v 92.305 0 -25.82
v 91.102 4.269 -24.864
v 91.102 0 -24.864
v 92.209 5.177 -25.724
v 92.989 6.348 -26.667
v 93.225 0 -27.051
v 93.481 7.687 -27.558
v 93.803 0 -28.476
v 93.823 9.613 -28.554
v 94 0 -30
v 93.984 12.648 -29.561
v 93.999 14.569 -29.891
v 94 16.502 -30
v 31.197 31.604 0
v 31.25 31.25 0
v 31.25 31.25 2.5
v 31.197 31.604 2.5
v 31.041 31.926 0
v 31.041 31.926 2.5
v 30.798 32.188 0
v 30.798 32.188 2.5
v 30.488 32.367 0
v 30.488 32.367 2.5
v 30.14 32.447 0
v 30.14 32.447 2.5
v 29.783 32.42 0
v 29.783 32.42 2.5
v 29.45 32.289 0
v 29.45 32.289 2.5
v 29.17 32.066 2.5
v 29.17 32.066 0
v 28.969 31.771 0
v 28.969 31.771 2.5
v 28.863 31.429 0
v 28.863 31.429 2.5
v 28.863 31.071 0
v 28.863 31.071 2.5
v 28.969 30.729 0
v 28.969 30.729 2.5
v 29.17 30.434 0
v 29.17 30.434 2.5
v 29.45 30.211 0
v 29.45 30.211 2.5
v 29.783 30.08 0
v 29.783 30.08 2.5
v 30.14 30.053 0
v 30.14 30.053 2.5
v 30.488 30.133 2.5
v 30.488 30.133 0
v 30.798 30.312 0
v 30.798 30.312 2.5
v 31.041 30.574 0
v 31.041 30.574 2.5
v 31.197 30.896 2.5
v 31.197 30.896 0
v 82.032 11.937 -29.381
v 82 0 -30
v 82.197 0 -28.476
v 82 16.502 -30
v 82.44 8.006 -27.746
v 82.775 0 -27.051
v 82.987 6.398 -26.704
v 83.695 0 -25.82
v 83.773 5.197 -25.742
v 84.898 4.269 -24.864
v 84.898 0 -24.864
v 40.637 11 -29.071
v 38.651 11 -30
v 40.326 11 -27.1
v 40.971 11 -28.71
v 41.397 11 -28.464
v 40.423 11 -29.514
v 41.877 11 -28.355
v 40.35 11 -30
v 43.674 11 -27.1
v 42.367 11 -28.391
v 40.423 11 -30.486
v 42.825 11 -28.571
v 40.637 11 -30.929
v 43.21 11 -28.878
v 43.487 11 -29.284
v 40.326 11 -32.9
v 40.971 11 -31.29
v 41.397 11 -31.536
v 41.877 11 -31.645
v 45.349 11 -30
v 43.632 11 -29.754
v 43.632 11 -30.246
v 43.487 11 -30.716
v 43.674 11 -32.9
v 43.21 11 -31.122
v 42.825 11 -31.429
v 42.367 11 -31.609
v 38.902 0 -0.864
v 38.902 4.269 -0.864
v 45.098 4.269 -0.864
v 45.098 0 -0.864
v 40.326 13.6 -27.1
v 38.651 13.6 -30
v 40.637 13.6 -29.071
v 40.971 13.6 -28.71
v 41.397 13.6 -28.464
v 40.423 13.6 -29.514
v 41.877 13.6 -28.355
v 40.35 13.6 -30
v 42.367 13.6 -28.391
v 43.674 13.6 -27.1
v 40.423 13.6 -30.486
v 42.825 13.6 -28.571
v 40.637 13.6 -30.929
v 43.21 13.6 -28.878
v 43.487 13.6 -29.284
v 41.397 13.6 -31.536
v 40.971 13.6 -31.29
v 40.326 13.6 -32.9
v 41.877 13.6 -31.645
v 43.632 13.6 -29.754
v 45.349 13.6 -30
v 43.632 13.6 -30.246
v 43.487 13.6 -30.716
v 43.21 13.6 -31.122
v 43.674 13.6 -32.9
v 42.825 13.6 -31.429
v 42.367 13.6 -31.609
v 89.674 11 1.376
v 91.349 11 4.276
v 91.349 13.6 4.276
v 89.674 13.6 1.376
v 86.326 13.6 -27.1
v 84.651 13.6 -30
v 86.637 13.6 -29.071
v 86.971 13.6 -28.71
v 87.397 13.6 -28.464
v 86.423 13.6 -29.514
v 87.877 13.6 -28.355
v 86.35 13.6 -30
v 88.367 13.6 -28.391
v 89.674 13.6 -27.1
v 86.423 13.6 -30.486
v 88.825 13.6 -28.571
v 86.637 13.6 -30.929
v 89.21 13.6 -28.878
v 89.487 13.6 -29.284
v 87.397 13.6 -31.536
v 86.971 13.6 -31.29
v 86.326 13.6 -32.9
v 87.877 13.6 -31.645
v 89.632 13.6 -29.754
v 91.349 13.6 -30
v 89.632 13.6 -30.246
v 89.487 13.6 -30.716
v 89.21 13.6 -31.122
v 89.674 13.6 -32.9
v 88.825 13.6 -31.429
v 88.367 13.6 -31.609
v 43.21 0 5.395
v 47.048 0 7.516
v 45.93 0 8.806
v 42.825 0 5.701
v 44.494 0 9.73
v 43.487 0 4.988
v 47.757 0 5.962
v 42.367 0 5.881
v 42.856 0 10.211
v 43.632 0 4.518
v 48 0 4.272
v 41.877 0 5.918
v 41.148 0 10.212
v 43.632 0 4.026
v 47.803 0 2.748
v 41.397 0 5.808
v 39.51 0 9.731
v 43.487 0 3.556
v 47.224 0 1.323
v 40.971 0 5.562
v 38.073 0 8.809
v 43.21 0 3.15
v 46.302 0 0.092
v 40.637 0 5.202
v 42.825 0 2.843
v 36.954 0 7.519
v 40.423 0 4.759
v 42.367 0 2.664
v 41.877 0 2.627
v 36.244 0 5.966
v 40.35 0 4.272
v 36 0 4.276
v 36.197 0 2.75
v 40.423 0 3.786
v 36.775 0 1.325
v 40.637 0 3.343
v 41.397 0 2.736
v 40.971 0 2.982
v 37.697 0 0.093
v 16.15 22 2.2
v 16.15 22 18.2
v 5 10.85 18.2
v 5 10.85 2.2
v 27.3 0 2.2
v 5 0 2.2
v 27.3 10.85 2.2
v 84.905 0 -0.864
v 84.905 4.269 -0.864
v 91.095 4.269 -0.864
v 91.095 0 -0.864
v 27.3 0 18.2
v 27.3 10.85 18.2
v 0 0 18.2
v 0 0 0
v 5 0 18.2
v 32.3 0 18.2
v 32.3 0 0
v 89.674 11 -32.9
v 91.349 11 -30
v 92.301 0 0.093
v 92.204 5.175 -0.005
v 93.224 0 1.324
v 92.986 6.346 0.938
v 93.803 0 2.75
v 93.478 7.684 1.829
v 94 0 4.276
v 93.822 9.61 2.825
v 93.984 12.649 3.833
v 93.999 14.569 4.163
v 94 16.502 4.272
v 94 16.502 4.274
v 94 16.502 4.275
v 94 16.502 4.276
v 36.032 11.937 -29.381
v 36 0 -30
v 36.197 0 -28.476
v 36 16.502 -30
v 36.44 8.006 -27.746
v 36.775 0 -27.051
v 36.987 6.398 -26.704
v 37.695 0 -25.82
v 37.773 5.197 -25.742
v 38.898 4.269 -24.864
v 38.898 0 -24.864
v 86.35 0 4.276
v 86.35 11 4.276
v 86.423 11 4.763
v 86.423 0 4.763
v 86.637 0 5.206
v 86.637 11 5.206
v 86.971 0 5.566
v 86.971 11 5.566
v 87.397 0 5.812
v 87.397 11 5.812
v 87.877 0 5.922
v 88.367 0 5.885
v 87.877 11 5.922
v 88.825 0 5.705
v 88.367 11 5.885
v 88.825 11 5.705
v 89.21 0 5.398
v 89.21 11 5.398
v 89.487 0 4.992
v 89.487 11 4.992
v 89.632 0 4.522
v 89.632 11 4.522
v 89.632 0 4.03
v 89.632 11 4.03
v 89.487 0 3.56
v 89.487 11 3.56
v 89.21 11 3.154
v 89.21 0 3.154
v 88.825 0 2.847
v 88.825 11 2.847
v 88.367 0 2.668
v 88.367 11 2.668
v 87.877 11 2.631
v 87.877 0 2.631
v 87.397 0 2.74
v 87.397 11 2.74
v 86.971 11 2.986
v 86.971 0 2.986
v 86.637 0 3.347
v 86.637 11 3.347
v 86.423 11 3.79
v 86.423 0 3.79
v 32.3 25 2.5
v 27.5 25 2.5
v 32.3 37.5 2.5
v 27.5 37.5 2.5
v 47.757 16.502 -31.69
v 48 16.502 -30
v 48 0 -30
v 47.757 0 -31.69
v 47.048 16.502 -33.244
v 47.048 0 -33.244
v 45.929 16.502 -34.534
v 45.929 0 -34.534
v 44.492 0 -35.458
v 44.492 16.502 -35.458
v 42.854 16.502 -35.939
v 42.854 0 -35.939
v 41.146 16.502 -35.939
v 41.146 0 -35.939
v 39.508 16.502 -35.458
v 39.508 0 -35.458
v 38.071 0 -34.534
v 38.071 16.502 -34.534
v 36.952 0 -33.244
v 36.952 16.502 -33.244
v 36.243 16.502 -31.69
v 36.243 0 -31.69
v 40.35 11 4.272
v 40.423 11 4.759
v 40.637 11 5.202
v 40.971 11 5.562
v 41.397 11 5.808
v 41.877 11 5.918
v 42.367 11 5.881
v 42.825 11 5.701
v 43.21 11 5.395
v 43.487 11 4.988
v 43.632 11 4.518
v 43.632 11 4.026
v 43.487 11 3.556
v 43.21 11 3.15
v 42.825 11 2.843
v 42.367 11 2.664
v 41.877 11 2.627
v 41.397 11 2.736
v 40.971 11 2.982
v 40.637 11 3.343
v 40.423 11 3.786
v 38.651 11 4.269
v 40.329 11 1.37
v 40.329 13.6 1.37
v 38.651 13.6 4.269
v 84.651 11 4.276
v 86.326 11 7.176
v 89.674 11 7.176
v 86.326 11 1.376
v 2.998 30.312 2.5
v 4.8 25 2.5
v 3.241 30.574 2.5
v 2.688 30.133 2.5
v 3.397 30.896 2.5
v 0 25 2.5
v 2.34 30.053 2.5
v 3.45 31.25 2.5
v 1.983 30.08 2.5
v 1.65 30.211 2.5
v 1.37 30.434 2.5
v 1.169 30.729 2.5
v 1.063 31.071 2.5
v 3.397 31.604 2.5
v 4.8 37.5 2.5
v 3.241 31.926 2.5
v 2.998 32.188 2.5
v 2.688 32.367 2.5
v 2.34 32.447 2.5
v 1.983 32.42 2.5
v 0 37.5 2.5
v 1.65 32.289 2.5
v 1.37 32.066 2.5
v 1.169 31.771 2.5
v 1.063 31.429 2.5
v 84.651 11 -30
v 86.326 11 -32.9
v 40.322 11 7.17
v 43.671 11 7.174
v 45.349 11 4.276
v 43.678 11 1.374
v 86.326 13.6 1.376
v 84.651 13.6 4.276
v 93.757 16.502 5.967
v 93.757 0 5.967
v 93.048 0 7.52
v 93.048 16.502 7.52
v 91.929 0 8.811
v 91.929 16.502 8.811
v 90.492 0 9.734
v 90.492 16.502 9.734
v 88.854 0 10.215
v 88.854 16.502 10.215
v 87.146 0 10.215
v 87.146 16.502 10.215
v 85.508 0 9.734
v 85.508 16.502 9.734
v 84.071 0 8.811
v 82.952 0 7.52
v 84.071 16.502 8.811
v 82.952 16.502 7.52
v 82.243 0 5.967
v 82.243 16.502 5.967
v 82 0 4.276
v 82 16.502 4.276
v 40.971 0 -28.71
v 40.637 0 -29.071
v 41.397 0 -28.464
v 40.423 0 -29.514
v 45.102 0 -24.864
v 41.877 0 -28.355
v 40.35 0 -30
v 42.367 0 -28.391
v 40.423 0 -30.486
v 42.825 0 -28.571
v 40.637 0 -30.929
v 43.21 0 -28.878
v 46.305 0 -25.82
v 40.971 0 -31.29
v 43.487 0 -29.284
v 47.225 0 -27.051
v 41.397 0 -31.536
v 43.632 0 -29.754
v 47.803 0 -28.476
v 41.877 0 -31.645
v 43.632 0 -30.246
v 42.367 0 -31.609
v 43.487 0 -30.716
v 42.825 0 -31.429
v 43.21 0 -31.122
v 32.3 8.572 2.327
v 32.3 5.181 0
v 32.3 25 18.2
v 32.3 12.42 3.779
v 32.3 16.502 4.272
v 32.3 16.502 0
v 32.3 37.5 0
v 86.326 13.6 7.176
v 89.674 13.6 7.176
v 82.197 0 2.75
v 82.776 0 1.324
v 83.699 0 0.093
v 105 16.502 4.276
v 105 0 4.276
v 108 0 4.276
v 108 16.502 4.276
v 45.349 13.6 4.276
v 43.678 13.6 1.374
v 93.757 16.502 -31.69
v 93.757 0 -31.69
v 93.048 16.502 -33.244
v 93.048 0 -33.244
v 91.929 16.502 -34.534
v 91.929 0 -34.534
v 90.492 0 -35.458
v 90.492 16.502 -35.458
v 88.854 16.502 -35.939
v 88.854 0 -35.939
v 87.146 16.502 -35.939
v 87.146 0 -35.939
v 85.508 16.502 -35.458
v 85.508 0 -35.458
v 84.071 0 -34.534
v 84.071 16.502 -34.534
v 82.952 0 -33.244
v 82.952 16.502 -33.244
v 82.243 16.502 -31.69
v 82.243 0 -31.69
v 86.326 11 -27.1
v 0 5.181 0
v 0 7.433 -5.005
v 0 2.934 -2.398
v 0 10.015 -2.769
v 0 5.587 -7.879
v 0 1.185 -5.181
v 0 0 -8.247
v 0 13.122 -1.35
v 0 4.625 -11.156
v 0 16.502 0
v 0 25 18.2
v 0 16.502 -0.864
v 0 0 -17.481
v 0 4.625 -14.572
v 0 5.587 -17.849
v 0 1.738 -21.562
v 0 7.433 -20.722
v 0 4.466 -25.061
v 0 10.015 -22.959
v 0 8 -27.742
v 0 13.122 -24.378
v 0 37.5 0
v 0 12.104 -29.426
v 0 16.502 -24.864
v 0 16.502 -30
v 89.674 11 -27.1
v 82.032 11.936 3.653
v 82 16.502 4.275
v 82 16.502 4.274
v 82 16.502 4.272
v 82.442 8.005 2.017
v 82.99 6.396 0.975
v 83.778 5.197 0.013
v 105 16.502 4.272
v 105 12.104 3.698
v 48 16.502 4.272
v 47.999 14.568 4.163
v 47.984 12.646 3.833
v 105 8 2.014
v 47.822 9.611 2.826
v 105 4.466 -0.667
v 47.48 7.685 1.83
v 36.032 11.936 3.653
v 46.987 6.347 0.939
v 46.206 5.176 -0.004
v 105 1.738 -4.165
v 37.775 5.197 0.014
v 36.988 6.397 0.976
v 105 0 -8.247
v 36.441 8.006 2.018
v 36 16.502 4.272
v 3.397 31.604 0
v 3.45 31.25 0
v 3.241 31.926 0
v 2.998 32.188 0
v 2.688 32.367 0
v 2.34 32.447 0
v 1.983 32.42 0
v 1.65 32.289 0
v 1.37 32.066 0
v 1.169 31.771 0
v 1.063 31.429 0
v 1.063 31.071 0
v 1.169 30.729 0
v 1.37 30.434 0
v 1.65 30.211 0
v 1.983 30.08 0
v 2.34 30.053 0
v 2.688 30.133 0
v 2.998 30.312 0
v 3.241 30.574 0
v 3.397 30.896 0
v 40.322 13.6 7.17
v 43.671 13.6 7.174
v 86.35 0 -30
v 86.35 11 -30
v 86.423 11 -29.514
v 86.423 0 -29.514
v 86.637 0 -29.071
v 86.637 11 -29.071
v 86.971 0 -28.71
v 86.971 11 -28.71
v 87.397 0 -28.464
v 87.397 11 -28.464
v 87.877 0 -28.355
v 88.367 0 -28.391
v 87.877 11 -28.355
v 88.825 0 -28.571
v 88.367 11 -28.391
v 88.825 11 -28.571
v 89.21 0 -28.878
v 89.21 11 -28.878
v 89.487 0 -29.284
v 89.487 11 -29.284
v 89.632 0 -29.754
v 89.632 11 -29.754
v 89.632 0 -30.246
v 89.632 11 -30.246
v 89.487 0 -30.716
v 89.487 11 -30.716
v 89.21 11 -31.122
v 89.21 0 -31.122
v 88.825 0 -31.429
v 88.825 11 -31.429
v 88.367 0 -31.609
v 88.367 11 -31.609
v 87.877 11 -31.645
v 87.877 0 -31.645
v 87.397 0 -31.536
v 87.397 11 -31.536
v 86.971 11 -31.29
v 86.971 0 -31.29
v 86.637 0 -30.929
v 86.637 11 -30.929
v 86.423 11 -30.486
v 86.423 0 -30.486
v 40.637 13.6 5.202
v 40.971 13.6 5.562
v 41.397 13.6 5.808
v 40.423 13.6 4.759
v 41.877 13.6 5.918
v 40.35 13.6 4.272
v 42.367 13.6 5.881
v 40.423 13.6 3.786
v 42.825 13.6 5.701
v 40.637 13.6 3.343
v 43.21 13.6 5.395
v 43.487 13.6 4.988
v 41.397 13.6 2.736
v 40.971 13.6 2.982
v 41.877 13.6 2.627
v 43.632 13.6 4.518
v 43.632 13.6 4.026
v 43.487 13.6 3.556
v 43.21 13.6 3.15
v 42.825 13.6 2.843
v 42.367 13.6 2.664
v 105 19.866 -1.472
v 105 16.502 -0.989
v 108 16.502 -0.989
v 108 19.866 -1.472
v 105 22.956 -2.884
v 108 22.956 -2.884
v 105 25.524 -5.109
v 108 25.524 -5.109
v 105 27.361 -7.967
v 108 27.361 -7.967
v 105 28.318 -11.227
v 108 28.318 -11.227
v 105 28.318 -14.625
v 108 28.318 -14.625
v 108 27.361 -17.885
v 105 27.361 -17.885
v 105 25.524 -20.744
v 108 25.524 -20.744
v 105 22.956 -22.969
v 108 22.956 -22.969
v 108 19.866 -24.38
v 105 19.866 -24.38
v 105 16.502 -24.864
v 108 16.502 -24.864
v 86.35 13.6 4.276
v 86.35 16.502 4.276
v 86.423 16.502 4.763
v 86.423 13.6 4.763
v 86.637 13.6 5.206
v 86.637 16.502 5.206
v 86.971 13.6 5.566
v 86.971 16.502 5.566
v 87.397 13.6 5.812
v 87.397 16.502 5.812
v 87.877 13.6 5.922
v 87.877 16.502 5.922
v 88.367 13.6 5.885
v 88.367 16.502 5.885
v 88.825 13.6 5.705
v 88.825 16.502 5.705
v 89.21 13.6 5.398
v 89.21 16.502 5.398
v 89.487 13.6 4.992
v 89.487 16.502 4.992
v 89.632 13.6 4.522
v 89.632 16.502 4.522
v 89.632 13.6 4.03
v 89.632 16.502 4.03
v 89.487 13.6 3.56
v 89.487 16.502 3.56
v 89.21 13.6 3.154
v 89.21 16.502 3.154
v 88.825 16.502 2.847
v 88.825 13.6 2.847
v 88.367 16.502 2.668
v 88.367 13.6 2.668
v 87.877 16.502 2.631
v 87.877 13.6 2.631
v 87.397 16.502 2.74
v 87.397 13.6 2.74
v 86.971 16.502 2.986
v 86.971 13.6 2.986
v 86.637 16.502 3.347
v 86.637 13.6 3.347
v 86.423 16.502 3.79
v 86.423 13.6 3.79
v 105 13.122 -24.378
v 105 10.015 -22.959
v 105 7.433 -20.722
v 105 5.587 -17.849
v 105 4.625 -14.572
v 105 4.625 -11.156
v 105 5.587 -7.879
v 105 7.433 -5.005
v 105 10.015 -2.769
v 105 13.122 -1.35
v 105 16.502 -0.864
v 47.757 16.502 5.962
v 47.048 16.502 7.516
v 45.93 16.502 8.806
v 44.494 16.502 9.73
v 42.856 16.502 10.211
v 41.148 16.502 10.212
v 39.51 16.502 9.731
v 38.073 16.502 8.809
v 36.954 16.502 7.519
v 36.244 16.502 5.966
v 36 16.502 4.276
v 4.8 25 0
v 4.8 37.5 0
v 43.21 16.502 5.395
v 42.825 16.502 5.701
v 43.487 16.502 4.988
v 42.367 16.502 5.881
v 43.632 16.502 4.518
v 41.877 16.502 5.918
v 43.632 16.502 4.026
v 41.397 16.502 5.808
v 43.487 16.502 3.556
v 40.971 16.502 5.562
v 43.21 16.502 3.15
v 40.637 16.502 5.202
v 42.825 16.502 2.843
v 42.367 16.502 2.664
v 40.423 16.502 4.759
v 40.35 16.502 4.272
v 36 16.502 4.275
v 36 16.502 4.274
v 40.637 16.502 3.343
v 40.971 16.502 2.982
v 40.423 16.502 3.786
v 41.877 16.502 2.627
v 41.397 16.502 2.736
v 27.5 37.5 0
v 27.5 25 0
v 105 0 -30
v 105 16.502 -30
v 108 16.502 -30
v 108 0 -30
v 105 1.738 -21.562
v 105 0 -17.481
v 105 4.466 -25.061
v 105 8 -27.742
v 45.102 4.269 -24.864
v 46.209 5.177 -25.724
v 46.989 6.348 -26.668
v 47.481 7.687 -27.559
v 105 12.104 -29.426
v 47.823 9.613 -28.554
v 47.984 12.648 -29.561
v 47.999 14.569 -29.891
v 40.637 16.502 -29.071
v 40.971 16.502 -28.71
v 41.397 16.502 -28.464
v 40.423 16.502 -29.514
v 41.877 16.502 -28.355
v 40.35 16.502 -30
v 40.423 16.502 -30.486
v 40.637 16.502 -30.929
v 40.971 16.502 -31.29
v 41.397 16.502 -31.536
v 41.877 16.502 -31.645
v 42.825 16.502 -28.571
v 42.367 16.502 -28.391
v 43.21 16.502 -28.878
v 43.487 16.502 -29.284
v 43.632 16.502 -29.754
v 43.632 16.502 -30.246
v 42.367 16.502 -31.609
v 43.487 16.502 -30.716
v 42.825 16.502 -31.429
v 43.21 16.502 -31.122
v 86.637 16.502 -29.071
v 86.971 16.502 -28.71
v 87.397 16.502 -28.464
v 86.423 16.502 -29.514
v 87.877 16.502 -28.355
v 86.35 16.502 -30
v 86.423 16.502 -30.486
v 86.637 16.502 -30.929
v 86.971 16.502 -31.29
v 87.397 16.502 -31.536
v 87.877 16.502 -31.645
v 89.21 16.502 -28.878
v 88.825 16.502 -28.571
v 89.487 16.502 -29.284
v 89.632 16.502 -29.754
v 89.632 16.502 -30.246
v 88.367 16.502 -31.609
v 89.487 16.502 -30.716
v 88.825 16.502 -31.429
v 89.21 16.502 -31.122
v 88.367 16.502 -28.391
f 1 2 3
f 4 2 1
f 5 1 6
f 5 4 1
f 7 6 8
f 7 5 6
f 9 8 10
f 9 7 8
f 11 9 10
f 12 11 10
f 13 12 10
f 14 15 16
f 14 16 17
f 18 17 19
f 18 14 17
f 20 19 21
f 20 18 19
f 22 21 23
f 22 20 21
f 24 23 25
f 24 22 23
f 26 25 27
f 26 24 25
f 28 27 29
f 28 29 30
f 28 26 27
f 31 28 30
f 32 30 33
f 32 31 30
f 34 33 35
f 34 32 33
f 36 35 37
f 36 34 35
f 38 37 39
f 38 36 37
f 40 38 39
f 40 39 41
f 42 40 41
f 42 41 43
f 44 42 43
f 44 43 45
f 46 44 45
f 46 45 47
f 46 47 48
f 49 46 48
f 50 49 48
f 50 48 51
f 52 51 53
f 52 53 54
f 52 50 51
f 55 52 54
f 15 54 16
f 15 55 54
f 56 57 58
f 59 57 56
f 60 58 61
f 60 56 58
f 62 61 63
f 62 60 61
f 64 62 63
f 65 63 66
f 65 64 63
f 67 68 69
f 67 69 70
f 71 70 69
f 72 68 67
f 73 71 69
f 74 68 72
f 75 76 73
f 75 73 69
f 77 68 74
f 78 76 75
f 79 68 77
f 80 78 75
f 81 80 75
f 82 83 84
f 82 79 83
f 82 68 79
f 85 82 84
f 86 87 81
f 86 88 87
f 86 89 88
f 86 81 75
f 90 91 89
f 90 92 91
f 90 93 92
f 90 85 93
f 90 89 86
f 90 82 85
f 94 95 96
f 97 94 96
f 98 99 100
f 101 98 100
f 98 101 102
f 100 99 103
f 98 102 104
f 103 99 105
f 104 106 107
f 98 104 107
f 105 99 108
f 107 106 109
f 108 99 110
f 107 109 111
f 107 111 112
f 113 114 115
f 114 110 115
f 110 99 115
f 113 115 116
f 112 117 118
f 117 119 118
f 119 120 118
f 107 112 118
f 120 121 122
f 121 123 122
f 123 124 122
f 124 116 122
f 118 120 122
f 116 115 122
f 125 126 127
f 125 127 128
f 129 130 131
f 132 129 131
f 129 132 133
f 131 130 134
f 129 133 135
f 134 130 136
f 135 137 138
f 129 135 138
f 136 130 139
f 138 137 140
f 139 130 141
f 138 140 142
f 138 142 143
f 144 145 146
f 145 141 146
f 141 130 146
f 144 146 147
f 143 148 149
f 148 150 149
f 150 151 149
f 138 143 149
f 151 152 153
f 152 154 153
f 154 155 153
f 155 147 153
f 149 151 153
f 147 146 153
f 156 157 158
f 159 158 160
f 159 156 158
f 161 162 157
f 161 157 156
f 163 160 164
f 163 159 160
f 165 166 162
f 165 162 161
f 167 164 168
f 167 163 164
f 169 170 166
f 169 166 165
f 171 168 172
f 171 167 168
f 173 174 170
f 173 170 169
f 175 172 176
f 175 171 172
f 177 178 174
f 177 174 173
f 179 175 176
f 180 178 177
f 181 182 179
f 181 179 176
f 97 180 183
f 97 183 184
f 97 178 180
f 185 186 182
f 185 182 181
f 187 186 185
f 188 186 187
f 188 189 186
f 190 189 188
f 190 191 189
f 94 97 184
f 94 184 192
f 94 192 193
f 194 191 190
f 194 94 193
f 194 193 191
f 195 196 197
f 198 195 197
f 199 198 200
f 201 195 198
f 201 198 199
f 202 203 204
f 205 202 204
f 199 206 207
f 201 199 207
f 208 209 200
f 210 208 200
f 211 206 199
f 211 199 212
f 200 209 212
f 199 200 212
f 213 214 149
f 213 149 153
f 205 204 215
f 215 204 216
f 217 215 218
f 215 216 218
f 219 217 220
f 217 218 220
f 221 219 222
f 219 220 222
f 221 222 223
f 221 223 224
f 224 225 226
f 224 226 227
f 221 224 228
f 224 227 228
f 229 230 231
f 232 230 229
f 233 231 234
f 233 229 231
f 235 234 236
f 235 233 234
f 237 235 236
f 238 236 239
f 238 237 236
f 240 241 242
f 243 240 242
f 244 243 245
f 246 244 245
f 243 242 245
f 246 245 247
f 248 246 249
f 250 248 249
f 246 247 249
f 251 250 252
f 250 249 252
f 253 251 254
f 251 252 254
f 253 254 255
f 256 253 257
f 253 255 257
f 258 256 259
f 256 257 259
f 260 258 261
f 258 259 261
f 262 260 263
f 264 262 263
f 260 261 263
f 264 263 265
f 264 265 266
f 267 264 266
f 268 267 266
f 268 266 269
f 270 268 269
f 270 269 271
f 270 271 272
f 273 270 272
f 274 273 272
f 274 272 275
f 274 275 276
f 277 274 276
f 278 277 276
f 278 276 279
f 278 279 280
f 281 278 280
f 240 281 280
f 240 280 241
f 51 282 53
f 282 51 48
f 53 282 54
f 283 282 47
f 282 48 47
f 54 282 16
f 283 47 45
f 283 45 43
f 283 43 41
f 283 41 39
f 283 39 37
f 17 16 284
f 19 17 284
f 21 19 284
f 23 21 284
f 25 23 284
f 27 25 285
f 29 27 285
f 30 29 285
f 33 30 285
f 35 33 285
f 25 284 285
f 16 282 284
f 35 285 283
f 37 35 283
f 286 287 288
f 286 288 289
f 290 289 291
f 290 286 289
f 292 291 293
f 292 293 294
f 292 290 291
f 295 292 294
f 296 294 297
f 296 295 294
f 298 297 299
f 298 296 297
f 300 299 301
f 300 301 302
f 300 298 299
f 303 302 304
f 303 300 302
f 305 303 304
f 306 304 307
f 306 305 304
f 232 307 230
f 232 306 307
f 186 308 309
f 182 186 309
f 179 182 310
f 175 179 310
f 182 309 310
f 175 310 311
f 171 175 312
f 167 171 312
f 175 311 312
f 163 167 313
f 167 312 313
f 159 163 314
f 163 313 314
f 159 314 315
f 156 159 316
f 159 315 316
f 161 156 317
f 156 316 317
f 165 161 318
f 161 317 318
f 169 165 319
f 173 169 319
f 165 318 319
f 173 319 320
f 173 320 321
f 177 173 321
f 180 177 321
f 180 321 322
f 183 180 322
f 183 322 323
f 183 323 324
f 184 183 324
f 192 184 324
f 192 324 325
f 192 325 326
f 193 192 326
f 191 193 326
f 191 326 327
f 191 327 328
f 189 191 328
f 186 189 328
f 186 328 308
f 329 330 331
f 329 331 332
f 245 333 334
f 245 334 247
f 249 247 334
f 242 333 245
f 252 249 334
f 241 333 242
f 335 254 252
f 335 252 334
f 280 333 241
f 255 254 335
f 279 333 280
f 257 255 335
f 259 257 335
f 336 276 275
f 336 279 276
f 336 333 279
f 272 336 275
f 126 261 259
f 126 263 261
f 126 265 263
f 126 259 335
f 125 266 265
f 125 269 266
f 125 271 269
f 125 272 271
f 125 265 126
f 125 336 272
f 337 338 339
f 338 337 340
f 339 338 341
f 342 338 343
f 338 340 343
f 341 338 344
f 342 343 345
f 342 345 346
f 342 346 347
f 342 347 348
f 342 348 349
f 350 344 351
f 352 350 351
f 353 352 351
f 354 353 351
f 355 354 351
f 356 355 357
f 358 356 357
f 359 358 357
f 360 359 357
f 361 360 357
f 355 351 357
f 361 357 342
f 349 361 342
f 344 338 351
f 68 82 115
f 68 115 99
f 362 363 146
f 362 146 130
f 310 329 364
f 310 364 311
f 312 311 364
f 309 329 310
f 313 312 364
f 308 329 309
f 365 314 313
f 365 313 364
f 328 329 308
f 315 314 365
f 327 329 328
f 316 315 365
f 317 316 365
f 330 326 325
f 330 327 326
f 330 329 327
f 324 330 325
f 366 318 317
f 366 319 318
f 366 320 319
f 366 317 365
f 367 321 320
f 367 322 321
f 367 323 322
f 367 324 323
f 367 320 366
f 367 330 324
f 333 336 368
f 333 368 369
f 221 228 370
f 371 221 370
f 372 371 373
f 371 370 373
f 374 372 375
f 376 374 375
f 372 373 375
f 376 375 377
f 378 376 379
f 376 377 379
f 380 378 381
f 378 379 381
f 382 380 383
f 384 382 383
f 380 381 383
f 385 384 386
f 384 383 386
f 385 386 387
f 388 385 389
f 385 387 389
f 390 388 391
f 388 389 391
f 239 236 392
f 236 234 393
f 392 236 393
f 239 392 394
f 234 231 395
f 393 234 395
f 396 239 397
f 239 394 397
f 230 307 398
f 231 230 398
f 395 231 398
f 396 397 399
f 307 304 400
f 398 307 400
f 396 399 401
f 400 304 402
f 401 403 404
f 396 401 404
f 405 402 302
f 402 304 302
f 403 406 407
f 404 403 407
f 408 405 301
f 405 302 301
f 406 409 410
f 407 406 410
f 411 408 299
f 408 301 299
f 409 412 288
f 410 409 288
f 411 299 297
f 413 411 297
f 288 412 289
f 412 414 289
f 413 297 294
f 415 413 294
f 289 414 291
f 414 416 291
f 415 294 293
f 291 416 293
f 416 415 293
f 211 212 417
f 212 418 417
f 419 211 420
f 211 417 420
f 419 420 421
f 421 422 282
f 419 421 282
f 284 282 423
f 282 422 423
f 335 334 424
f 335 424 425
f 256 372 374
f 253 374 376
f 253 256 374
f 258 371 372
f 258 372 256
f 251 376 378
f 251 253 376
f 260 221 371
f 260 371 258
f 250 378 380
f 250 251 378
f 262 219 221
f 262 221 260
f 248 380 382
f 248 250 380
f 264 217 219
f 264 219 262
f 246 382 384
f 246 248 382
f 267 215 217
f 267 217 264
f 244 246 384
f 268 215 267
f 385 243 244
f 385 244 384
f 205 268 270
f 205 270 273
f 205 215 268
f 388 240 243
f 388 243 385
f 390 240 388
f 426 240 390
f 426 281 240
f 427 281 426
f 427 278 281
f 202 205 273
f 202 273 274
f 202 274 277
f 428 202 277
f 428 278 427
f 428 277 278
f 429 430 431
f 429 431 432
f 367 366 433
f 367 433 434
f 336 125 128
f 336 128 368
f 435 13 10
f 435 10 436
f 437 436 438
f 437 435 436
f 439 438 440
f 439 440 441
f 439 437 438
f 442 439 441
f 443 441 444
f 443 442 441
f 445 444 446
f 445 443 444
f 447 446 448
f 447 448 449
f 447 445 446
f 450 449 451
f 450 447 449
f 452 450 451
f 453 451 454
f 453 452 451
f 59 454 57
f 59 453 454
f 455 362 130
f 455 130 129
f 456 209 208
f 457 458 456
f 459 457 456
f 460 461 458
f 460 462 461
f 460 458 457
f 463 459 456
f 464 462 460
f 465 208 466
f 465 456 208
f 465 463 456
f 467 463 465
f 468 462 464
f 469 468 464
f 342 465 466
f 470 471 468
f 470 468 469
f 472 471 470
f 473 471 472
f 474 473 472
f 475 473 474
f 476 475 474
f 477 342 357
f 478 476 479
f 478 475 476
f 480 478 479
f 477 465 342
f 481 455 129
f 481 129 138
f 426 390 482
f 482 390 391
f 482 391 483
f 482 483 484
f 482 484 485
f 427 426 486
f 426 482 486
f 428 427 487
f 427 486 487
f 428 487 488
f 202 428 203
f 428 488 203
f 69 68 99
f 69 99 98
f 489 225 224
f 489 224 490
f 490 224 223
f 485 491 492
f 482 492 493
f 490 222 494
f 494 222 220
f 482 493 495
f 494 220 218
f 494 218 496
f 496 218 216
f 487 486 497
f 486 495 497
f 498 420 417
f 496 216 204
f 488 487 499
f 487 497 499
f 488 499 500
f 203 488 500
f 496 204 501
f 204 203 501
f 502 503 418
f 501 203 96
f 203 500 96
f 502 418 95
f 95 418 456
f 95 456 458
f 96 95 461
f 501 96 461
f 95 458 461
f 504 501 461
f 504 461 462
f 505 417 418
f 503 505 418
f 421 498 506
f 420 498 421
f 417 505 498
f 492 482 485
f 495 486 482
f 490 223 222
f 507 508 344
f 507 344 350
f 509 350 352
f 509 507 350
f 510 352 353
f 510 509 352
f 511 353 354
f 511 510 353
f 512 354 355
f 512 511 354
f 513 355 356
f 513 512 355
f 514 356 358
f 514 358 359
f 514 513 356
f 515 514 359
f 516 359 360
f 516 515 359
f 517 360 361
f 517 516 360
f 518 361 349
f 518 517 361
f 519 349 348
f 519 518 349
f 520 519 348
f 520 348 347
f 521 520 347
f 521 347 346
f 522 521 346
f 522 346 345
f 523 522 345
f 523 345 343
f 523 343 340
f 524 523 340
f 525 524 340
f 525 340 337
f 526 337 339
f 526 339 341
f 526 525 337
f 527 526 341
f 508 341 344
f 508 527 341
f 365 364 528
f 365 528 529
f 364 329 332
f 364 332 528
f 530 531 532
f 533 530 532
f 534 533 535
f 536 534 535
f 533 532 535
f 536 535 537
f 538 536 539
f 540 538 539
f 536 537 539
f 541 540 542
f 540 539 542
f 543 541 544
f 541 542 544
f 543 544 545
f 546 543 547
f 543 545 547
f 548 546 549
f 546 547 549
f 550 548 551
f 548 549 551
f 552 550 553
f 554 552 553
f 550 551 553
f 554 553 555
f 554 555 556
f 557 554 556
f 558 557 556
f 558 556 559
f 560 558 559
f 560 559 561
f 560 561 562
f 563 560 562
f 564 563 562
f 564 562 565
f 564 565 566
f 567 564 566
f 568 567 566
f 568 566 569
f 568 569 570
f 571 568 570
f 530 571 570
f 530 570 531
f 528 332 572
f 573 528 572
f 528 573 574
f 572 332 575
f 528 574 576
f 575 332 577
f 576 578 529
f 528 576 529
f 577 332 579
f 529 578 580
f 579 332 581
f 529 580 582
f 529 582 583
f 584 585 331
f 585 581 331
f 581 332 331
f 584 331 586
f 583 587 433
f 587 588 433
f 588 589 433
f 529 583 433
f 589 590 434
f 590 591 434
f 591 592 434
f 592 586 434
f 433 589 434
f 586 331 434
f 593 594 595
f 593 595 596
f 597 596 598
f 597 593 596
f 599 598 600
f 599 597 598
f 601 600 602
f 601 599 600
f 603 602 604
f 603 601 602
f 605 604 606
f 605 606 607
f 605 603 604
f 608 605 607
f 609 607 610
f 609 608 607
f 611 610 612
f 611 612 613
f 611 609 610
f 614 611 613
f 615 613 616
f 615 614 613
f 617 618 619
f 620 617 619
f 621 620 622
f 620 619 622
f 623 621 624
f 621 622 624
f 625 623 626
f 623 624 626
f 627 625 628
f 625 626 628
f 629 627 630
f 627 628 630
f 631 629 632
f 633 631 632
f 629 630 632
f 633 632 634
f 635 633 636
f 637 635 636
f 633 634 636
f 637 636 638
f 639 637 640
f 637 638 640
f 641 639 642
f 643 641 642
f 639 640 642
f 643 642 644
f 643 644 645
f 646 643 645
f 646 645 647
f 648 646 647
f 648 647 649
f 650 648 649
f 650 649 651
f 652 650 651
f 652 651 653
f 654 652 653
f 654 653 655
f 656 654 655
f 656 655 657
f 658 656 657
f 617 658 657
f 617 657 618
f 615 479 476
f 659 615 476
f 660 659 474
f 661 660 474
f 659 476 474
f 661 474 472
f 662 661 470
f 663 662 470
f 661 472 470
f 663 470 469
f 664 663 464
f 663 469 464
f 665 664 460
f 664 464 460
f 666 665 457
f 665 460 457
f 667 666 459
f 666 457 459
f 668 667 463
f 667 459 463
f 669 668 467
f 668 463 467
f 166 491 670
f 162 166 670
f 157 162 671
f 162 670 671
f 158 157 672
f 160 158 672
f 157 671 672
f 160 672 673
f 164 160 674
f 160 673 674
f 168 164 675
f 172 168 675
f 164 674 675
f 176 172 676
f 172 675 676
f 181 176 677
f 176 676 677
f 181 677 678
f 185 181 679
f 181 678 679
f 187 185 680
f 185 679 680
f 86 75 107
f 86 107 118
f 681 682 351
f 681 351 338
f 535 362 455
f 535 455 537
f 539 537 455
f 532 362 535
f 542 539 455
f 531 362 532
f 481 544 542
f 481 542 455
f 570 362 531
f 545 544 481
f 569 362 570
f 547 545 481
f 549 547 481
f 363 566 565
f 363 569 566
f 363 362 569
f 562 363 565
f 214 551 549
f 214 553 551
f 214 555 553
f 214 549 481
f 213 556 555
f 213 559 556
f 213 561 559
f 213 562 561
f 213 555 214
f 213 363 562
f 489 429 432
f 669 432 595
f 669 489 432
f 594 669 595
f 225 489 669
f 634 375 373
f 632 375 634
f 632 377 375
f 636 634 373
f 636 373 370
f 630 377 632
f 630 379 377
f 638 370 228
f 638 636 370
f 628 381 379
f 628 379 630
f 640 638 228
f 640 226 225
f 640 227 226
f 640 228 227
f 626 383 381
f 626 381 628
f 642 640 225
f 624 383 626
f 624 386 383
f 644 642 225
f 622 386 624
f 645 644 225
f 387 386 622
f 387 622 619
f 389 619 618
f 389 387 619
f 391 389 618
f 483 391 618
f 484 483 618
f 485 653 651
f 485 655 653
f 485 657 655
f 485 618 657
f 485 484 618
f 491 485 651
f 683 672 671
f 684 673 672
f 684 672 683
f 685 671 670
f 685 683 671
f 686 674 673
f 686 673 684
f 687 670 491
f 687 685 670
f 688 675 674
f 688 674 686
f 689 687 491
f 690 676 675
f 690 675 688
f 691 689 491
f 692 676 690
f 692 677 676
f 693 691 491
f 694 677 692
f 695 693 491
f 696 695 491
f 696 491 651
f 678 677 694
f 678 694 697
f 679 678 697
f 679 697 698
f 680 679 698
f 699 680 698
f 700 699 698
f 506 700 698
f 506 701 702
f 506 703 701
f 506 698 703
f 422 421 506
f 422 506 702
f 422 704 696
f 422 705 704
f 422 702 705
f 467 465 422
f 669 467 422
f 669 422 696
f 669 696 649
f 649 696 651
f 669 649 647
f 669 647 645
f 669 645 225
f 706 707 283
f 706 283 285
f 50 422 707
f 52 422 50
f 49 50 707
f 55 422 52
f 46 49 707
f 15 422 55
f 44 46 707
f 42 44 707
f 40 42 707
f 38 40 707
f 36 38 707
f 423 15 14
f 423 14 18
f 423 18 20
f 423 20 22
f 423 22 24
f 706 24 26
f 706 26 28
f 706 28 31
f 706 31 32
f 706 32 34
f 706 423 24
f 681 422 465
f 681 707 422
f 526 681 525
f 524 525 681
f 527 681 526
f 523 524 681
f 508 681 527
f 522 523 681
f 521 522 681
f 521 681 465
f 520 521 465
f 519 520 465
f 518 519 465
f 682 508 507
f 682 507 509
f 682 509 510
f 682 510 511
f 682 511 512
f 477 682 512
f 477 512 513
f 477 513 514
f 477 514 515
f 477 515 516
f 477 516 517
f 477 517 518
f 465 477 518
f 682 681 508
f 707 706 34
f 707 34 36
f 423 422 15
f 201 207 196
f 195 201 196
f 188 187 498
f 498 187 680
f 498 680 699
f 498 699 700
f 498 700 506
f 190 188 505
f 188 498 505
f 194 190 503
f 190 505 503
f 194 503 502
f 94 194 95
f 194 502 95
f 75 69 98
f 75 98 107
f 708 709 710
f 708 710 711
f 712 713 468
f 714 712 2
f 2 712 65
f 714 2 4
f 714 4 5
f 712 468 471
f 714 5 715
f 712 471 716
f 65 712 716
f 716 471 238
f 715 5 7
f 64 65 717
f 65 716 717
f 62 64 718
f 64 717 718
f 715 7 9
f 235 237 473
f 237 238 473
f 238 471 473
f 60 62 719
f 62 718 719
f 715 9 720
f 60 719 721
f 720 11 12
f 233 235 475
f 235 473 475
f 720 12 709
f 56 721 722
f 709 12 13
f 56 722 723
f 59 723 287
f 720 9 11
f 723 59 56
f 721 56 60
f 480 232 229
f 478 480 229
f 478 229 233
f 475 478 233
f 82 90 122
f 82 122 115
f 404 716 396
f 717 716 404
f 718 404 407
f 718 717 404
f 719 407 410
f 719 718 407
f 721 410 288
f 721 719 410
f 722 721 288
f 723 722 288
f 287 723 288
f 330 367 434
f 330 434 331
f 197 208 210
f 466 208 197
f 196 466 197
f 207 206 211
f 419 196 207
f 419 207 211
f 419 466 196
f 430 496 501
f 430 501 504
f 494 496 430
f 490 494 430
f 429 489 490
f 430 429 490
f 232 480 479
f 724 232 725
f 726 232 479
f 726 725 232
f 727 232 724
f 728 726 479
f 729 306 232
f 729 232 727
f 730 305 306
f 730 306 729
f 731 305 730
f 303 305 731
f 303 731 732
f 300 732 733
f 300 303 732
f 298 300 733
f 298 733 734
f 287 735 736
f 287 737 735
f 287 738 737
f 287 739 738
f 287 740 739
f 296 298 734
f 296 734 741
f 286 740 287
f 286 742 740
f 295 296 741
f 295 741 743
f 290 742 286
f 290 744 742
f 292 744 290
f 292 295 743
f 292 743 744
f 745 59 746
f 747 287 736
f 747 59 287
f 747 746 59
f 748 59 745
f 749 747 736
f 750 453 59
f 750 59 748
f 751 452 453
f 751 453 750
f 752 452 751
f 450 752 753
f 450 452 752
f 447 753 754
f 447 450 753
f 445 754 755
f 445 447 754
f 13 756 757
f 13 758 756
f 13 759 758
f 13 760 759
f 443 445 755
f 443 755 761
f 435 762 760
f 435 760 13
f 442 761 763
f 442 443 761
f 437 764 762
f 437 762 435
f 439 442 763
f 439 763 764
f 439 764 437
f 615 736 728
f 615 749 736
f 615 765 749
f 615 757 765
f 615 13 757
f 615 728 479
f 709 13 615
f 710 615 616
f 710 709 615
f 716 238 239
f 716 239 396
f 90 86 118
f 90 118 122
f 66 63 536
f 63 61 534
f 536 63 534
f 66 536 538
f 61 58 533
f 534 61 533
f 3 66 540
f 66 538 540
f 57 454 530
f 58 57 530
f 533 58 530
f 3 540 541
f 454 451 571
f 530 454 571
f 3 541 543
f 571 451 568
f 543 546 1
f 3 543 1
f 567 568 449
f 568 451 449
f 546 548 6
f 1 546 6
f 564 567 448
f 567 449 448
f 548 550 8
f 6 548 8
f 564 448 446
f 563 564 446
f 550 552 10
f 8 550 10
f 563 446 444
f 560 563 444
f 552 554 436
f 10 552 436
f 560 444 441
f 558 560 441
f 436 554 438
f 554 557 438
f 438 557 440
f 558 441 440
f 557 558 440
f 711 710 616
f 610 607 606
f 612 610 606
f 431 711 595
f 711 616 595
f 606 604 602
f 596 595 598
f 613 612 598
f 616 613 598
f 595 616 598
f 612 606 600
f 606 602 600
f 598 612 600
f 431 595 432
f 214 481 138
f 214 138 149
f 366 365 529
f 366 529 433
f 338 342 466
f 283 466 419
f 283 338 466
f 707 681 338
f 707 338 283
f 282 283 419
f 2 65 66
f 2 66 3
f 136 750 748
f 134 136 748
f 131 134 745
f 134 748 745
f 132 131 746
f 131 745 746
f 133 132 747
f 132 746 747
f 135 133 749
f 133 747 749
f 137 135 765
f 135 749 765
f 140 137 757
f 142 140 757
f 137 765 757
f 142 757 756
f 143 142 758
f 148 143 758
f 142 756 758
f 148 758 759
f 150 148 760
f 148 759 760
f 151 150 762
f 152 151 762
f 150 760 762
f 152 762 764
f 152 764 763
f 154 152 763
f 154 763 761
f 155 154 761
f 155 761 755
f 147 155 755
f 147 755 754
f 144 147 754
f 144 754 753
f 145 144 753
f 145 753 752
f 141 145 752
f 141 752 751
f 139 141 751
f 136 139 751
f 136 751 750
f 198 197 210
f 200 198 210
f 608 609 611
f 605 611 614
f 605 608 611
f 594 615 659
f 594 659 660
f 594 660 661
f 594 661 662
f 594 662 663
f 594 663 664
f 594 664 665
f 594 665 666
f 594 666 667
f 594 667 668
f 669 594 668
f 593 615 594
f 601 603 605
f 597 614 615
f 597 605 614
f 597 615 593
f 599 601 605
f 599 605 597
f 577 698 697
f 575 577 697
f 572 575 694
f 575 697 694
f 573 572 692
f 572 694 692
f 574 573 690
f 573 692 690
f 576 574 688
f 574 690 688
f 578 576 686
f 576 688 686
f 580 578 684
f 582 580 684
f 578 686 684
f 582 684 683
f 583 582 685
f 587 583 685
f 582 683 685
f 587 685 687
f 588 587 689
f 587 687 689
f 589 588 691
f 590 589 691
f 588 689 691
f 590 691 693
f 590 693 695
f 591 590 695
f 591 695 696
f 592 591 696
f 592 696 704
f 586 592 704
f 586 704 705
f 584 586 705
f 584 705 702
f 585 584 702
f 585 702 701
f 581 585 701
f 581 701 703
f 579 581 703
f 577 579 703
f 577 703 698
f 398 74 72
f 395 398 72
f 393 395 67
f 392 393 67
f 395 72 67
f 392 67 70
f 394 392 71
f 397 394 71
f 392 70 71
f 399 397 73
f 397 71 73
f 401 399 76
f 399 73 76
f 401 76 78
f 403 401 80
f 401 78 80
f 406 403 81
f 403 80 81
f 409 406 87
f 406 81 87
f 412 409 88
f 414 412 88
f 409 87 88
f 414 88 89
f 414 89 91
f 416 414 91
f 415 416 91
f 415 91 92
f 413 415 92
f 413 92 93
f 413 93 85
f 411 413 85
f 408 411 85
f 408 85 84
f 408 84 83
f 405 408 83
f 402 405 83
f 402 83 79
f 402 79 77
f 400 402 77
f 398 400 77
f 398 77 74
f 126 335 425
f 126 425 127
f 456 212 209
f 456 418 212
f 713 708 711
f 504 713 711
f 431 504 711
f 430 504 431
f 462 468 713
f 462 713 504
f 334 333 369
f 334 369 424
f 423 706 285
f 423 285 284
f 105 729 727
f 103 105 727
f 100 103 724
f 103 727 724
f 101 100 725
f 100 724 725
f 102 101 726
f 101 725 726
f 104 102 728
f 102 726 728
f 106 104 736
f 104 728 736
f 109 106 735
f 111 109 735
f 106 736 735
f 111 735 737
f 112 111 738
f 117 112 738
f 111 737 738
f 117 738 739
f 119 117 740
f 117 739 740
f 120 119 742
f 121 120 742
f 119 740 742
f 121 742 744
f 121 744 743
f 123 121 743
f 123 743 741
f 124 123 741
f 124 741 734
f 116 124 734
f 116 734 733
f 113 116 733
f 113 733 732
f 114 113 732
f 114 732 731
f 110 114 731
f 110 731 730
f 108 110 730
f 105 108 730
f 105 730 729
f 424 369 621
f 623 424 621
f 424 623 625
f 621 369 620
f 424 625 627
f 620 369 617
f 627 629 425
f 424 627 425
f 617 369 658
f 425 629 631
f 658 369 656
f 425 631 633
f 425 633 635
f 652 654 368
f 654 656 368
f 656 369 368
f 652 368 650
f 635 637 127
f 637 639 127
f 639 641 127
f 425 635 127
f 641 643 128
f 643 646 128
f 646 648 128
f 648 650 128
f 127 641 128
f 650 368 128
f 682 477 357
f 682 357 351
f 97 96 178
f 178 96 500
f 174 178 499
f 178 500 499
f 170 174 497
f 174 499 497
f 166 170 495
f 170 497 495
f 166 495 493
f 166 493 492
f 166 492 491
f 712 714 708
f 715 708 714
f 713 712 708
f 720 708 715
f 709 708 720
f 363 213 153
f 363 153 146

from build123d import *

# Parameters (mm, degrees)
SKETCH1_R           = 1.2
BOSS_EXTRUDE1_DEPTH = 2.5
SKETCH2_W           = 32.3
SKETCH2_H           = 25
BOSS_EXTRUDE2_DEPTH = 15.7
BOSS_EXTRUDE3_DEPTH = 105
BOSS_EXTRUDE4_START = 105
BOSS_EXTRUDE4_DEPTH = 3
BOSS_EXTRUDE5_DEPTH = 16.502469
SKETCH8_R           = 1.65
CUT_EXTRUDE1_DEPTH  = 46.267987394
CUT_EXTRUDE2_START  = 11
CUT_EXTRUDE2_DEPTH  = 2.6
CUT_EXTRUDE3_DEPTH  = 16


with BuildPart() as part:
    # Sketch1 → Boss-Extrude1 (new body)
    with BuildSketch(Plane.XY):
        Polygon((0, 0), (0, 37.5), (4.8, 37.5), (4.8, 25), (27.5, 25), (27.5, 37.5), (32.3, 37.5), (32.3, 0), align=None)
        with Locations((2.25, 31.25)):
            Circle(SKETCH1_R, mode=Mode.SUBTRACT)
        with Locations((30.05, 31.25)):
            Circle(SKETCH1_R, mode=Mode.SUBTRACT)
    extrude(amount=BOSS_EXTRUDE1_DEPTH)

    # Sketch2 → Boss-Extrude2 (add)
    with BuildSketch(Plane.XY.offset(2.5)):
        with Locations((16.15, 12.5)):
            Rectangle(SKETCH2_W, SKETCH2_H)
    extrude(amount=BOSS_EXTRUDE2_DEPTH)

    # Sketch4 → Boss-Extrude3 (add)
    with BuildSketch(Plane(origin=(0, 0, 0), x_dir=(0, 0, -1), z_dir=(1, 0, 0))):
        with BuildLine():
            ThreePointArc((-4.272382365, 16.502469348), (-0.788451938, 6.145596051), (8.24671518, 0))
            Line((8.24671518, 0), (17.480902455, 0))
            ThreePointArc((17.480902455, 0), (26.516069574, 6.145596051), (30, 16.502469348))
            Line((30, 16.502469348), (24.863808818, 16.502469348))
            ThreePointArc((24.863808818, 16.502469348), (12.863808818, 4.502469348), (0.863808818, 16.502469348))
            Line((0.863808818, 16.502469348), (-4.272382365, 16.502469348))
        make_face()
    extrude(amount=BOSS_EXTRUDE3_DEPTH)

    # Sketch5 → Boss-Extrude4 (add)
    with BuildSketch(Plane(origin=(0, 0, 0), x_dir=(0, 0, -1), z_dir=(1, 0, 0)).offset(BOSS_EXTRUDE4_START)):
        with BuildLine():
            Line((24.863808818, 16.502469348), (30, 16.502469348))
            Line((30, 16.502469348), (30, 0))
            Line((30, 0), (-4.276191182, 0))
            Line((-4.276191182, 0), (-4.276191182, 16.502469348))
            Line((-4.276191182, 16.502469348), (0.988808818, 16.502469348))
            ThreePointArc((0.988808818, 16.502469348), (12.926308818, 28.439969348), (24.863808818, 16.502469348))
        make_face()
    extrude(amount=BOSS_EXTRUDE4_DEPTH)

    # Sketch6 → Boss-Extrude5 (add)
    with BuildSketch(Plane(origin=(0, 16.502469348, 0), x_dir=(1, 0, 0), z_dir=(0, 1, 0))):
        with BuildLine():
            ThreePointArc((48, 30), (42, 36), (36, 30))
            Line((36, 30), (48, 30))
        make_face()
        with BuildLine():
            ThreePointArc((36, 30), (36.774618191, 27.051206187), (38.89846165, 24.863808818))
            Line((38.89846165, 24.863808818), (45.10153835, 24.863808818))
            ThreePointArc((45.10153835, 24.863808818), (47.225381809, 27.051206187), (48, 30))
            Line((48, 30), (36, 30))
        make_face()
        with BuildLine():
            ThreePointArc((45.098382452, 0.863808818), (47.224007714, -1.323058877), (48, -4.272382365))
            ThreePointArc((48, -4.272382365), (42.001904409, -10.272382062), (36.000001209, -4.276191181))
            ThreePointArc((36.000001209, -4.276191181), (36.775057034, -1.324717133), (38.901618757, 0.863808818))
            Line((38.901618757, 0.863808818), (45.098382452, 0.863808818))
        make_face()
        with BuildLine():
            ThreePointArc((91.095222125, 0.863808818), (93.223568356, -1.324186164), (94, -4.276191182))
            ThreePointArc((94, -4.276191182), (88, -10.276191182), (82, -4.276191182))
            ThreePointArc((82, -4.276191182), (82.776431644, -1.324186164), (84.904777875, 0.863808818))
            Line((84.904777875, 0.863808818), (91.095222125, 0.863808818))
        make_face()
        with BuildLine():
            ThreePointArc((94, 30), (88, 36), (82, 30))
            Line((82, 30), (94, 30))
        make_face()
        with BuildLine():
            ThreePointArc((82, 30), (82.774618191, 27.051206187), (84.89846165, 24.863808818))
            Line((84.89846165, 24.863808818), (91.10153835, 24.863808818))
            ThreePointArc((91.10153835, 24.863808818), (93.225381809, 27.051206187), (94, 30))
            Line((94, 30), (82, 30))
        make_face()
    extrude(amount=-BOSS_EXTRUDE5_DEPTH)

    # Sketch8 → Cut-Extrude1 (cut, through all)
    with BuildSketch(Plane(origin=(19.547405665, 45.267987294, 23.856702342), x_dir=(-1, 0, 0), z_dir=(0, 1, 0))):
        with Locations((-68.452594335, -19.58051116)):
            Circle(SKETCH8_R)
        with Locations((-22.452594335, -19.584319977)):
            Circle(SKETCH8_R)
        with Locations((-22.452594335, -53.856702342)):
            Circle(SKETCH8_R)
        with Locations((-68.452594335, -53.856702342)):
            Circle(SKETCH8_R)
    extrude(amount=-CUT_EXTRUDE1_DEPTH, mode=Mode.SUBTRACT)

    # Sketch9 → Cut-Extrude2 (cut)
    with BuildSketch(Plane(origin=(0, 0, 0), x_dir=(1, 0, 0), z_dir=(0, 1, 0)).offset(CUT_EXTRUDE2_START)):
        Polygon((45.348631561, 30), (43.674315781, 32.9), (40.325684219, 32.9), (38.651368439, 30), (40.325684219, 27.1), (43.674315781, 27.1), align=None)
        Polygon((91.348631561, 30), (89.674315781, 32.9), (86.325684219, 32.9), (84.651368439, 30), (86.325684219, 27.1), (89.674315781, 27.1), align=None)
        Polygon((45.348629319, -4.276258001), (43.677671059, -1.374322125), (40.32904174, -1.370446489), (38.651370681, -4.268506728), (40.322328941, -7.170442604), (43.67095826, -7.17431824), align=None)
        Polygon((91.348631561, -4.276191182), (89.674315781, -1.376191182), (86.325684219, -1.376191182), (84.651368439, -4.276191182), (86.325684219, -7.176191182), (89.674315781, -7.176191182), align=None)
    extrude(amount=CUT_EXTRUDE2_DEPTH, mode=Mode.SUBTRACT)

    # Sketch10 → Cut-Extrude3 (cut)
    with BuildSketch(Plane.XY.offset(18.2)):
        Polygon((5, 0), (27.3, 0), (27.3, 10.85), (16.15, 22), (5, 10.85), align=None)
    extrude(amount=-CUT_EXTRUDE3_DEPTH, mode=Mode.SUBTRACT)


solid = part.part
